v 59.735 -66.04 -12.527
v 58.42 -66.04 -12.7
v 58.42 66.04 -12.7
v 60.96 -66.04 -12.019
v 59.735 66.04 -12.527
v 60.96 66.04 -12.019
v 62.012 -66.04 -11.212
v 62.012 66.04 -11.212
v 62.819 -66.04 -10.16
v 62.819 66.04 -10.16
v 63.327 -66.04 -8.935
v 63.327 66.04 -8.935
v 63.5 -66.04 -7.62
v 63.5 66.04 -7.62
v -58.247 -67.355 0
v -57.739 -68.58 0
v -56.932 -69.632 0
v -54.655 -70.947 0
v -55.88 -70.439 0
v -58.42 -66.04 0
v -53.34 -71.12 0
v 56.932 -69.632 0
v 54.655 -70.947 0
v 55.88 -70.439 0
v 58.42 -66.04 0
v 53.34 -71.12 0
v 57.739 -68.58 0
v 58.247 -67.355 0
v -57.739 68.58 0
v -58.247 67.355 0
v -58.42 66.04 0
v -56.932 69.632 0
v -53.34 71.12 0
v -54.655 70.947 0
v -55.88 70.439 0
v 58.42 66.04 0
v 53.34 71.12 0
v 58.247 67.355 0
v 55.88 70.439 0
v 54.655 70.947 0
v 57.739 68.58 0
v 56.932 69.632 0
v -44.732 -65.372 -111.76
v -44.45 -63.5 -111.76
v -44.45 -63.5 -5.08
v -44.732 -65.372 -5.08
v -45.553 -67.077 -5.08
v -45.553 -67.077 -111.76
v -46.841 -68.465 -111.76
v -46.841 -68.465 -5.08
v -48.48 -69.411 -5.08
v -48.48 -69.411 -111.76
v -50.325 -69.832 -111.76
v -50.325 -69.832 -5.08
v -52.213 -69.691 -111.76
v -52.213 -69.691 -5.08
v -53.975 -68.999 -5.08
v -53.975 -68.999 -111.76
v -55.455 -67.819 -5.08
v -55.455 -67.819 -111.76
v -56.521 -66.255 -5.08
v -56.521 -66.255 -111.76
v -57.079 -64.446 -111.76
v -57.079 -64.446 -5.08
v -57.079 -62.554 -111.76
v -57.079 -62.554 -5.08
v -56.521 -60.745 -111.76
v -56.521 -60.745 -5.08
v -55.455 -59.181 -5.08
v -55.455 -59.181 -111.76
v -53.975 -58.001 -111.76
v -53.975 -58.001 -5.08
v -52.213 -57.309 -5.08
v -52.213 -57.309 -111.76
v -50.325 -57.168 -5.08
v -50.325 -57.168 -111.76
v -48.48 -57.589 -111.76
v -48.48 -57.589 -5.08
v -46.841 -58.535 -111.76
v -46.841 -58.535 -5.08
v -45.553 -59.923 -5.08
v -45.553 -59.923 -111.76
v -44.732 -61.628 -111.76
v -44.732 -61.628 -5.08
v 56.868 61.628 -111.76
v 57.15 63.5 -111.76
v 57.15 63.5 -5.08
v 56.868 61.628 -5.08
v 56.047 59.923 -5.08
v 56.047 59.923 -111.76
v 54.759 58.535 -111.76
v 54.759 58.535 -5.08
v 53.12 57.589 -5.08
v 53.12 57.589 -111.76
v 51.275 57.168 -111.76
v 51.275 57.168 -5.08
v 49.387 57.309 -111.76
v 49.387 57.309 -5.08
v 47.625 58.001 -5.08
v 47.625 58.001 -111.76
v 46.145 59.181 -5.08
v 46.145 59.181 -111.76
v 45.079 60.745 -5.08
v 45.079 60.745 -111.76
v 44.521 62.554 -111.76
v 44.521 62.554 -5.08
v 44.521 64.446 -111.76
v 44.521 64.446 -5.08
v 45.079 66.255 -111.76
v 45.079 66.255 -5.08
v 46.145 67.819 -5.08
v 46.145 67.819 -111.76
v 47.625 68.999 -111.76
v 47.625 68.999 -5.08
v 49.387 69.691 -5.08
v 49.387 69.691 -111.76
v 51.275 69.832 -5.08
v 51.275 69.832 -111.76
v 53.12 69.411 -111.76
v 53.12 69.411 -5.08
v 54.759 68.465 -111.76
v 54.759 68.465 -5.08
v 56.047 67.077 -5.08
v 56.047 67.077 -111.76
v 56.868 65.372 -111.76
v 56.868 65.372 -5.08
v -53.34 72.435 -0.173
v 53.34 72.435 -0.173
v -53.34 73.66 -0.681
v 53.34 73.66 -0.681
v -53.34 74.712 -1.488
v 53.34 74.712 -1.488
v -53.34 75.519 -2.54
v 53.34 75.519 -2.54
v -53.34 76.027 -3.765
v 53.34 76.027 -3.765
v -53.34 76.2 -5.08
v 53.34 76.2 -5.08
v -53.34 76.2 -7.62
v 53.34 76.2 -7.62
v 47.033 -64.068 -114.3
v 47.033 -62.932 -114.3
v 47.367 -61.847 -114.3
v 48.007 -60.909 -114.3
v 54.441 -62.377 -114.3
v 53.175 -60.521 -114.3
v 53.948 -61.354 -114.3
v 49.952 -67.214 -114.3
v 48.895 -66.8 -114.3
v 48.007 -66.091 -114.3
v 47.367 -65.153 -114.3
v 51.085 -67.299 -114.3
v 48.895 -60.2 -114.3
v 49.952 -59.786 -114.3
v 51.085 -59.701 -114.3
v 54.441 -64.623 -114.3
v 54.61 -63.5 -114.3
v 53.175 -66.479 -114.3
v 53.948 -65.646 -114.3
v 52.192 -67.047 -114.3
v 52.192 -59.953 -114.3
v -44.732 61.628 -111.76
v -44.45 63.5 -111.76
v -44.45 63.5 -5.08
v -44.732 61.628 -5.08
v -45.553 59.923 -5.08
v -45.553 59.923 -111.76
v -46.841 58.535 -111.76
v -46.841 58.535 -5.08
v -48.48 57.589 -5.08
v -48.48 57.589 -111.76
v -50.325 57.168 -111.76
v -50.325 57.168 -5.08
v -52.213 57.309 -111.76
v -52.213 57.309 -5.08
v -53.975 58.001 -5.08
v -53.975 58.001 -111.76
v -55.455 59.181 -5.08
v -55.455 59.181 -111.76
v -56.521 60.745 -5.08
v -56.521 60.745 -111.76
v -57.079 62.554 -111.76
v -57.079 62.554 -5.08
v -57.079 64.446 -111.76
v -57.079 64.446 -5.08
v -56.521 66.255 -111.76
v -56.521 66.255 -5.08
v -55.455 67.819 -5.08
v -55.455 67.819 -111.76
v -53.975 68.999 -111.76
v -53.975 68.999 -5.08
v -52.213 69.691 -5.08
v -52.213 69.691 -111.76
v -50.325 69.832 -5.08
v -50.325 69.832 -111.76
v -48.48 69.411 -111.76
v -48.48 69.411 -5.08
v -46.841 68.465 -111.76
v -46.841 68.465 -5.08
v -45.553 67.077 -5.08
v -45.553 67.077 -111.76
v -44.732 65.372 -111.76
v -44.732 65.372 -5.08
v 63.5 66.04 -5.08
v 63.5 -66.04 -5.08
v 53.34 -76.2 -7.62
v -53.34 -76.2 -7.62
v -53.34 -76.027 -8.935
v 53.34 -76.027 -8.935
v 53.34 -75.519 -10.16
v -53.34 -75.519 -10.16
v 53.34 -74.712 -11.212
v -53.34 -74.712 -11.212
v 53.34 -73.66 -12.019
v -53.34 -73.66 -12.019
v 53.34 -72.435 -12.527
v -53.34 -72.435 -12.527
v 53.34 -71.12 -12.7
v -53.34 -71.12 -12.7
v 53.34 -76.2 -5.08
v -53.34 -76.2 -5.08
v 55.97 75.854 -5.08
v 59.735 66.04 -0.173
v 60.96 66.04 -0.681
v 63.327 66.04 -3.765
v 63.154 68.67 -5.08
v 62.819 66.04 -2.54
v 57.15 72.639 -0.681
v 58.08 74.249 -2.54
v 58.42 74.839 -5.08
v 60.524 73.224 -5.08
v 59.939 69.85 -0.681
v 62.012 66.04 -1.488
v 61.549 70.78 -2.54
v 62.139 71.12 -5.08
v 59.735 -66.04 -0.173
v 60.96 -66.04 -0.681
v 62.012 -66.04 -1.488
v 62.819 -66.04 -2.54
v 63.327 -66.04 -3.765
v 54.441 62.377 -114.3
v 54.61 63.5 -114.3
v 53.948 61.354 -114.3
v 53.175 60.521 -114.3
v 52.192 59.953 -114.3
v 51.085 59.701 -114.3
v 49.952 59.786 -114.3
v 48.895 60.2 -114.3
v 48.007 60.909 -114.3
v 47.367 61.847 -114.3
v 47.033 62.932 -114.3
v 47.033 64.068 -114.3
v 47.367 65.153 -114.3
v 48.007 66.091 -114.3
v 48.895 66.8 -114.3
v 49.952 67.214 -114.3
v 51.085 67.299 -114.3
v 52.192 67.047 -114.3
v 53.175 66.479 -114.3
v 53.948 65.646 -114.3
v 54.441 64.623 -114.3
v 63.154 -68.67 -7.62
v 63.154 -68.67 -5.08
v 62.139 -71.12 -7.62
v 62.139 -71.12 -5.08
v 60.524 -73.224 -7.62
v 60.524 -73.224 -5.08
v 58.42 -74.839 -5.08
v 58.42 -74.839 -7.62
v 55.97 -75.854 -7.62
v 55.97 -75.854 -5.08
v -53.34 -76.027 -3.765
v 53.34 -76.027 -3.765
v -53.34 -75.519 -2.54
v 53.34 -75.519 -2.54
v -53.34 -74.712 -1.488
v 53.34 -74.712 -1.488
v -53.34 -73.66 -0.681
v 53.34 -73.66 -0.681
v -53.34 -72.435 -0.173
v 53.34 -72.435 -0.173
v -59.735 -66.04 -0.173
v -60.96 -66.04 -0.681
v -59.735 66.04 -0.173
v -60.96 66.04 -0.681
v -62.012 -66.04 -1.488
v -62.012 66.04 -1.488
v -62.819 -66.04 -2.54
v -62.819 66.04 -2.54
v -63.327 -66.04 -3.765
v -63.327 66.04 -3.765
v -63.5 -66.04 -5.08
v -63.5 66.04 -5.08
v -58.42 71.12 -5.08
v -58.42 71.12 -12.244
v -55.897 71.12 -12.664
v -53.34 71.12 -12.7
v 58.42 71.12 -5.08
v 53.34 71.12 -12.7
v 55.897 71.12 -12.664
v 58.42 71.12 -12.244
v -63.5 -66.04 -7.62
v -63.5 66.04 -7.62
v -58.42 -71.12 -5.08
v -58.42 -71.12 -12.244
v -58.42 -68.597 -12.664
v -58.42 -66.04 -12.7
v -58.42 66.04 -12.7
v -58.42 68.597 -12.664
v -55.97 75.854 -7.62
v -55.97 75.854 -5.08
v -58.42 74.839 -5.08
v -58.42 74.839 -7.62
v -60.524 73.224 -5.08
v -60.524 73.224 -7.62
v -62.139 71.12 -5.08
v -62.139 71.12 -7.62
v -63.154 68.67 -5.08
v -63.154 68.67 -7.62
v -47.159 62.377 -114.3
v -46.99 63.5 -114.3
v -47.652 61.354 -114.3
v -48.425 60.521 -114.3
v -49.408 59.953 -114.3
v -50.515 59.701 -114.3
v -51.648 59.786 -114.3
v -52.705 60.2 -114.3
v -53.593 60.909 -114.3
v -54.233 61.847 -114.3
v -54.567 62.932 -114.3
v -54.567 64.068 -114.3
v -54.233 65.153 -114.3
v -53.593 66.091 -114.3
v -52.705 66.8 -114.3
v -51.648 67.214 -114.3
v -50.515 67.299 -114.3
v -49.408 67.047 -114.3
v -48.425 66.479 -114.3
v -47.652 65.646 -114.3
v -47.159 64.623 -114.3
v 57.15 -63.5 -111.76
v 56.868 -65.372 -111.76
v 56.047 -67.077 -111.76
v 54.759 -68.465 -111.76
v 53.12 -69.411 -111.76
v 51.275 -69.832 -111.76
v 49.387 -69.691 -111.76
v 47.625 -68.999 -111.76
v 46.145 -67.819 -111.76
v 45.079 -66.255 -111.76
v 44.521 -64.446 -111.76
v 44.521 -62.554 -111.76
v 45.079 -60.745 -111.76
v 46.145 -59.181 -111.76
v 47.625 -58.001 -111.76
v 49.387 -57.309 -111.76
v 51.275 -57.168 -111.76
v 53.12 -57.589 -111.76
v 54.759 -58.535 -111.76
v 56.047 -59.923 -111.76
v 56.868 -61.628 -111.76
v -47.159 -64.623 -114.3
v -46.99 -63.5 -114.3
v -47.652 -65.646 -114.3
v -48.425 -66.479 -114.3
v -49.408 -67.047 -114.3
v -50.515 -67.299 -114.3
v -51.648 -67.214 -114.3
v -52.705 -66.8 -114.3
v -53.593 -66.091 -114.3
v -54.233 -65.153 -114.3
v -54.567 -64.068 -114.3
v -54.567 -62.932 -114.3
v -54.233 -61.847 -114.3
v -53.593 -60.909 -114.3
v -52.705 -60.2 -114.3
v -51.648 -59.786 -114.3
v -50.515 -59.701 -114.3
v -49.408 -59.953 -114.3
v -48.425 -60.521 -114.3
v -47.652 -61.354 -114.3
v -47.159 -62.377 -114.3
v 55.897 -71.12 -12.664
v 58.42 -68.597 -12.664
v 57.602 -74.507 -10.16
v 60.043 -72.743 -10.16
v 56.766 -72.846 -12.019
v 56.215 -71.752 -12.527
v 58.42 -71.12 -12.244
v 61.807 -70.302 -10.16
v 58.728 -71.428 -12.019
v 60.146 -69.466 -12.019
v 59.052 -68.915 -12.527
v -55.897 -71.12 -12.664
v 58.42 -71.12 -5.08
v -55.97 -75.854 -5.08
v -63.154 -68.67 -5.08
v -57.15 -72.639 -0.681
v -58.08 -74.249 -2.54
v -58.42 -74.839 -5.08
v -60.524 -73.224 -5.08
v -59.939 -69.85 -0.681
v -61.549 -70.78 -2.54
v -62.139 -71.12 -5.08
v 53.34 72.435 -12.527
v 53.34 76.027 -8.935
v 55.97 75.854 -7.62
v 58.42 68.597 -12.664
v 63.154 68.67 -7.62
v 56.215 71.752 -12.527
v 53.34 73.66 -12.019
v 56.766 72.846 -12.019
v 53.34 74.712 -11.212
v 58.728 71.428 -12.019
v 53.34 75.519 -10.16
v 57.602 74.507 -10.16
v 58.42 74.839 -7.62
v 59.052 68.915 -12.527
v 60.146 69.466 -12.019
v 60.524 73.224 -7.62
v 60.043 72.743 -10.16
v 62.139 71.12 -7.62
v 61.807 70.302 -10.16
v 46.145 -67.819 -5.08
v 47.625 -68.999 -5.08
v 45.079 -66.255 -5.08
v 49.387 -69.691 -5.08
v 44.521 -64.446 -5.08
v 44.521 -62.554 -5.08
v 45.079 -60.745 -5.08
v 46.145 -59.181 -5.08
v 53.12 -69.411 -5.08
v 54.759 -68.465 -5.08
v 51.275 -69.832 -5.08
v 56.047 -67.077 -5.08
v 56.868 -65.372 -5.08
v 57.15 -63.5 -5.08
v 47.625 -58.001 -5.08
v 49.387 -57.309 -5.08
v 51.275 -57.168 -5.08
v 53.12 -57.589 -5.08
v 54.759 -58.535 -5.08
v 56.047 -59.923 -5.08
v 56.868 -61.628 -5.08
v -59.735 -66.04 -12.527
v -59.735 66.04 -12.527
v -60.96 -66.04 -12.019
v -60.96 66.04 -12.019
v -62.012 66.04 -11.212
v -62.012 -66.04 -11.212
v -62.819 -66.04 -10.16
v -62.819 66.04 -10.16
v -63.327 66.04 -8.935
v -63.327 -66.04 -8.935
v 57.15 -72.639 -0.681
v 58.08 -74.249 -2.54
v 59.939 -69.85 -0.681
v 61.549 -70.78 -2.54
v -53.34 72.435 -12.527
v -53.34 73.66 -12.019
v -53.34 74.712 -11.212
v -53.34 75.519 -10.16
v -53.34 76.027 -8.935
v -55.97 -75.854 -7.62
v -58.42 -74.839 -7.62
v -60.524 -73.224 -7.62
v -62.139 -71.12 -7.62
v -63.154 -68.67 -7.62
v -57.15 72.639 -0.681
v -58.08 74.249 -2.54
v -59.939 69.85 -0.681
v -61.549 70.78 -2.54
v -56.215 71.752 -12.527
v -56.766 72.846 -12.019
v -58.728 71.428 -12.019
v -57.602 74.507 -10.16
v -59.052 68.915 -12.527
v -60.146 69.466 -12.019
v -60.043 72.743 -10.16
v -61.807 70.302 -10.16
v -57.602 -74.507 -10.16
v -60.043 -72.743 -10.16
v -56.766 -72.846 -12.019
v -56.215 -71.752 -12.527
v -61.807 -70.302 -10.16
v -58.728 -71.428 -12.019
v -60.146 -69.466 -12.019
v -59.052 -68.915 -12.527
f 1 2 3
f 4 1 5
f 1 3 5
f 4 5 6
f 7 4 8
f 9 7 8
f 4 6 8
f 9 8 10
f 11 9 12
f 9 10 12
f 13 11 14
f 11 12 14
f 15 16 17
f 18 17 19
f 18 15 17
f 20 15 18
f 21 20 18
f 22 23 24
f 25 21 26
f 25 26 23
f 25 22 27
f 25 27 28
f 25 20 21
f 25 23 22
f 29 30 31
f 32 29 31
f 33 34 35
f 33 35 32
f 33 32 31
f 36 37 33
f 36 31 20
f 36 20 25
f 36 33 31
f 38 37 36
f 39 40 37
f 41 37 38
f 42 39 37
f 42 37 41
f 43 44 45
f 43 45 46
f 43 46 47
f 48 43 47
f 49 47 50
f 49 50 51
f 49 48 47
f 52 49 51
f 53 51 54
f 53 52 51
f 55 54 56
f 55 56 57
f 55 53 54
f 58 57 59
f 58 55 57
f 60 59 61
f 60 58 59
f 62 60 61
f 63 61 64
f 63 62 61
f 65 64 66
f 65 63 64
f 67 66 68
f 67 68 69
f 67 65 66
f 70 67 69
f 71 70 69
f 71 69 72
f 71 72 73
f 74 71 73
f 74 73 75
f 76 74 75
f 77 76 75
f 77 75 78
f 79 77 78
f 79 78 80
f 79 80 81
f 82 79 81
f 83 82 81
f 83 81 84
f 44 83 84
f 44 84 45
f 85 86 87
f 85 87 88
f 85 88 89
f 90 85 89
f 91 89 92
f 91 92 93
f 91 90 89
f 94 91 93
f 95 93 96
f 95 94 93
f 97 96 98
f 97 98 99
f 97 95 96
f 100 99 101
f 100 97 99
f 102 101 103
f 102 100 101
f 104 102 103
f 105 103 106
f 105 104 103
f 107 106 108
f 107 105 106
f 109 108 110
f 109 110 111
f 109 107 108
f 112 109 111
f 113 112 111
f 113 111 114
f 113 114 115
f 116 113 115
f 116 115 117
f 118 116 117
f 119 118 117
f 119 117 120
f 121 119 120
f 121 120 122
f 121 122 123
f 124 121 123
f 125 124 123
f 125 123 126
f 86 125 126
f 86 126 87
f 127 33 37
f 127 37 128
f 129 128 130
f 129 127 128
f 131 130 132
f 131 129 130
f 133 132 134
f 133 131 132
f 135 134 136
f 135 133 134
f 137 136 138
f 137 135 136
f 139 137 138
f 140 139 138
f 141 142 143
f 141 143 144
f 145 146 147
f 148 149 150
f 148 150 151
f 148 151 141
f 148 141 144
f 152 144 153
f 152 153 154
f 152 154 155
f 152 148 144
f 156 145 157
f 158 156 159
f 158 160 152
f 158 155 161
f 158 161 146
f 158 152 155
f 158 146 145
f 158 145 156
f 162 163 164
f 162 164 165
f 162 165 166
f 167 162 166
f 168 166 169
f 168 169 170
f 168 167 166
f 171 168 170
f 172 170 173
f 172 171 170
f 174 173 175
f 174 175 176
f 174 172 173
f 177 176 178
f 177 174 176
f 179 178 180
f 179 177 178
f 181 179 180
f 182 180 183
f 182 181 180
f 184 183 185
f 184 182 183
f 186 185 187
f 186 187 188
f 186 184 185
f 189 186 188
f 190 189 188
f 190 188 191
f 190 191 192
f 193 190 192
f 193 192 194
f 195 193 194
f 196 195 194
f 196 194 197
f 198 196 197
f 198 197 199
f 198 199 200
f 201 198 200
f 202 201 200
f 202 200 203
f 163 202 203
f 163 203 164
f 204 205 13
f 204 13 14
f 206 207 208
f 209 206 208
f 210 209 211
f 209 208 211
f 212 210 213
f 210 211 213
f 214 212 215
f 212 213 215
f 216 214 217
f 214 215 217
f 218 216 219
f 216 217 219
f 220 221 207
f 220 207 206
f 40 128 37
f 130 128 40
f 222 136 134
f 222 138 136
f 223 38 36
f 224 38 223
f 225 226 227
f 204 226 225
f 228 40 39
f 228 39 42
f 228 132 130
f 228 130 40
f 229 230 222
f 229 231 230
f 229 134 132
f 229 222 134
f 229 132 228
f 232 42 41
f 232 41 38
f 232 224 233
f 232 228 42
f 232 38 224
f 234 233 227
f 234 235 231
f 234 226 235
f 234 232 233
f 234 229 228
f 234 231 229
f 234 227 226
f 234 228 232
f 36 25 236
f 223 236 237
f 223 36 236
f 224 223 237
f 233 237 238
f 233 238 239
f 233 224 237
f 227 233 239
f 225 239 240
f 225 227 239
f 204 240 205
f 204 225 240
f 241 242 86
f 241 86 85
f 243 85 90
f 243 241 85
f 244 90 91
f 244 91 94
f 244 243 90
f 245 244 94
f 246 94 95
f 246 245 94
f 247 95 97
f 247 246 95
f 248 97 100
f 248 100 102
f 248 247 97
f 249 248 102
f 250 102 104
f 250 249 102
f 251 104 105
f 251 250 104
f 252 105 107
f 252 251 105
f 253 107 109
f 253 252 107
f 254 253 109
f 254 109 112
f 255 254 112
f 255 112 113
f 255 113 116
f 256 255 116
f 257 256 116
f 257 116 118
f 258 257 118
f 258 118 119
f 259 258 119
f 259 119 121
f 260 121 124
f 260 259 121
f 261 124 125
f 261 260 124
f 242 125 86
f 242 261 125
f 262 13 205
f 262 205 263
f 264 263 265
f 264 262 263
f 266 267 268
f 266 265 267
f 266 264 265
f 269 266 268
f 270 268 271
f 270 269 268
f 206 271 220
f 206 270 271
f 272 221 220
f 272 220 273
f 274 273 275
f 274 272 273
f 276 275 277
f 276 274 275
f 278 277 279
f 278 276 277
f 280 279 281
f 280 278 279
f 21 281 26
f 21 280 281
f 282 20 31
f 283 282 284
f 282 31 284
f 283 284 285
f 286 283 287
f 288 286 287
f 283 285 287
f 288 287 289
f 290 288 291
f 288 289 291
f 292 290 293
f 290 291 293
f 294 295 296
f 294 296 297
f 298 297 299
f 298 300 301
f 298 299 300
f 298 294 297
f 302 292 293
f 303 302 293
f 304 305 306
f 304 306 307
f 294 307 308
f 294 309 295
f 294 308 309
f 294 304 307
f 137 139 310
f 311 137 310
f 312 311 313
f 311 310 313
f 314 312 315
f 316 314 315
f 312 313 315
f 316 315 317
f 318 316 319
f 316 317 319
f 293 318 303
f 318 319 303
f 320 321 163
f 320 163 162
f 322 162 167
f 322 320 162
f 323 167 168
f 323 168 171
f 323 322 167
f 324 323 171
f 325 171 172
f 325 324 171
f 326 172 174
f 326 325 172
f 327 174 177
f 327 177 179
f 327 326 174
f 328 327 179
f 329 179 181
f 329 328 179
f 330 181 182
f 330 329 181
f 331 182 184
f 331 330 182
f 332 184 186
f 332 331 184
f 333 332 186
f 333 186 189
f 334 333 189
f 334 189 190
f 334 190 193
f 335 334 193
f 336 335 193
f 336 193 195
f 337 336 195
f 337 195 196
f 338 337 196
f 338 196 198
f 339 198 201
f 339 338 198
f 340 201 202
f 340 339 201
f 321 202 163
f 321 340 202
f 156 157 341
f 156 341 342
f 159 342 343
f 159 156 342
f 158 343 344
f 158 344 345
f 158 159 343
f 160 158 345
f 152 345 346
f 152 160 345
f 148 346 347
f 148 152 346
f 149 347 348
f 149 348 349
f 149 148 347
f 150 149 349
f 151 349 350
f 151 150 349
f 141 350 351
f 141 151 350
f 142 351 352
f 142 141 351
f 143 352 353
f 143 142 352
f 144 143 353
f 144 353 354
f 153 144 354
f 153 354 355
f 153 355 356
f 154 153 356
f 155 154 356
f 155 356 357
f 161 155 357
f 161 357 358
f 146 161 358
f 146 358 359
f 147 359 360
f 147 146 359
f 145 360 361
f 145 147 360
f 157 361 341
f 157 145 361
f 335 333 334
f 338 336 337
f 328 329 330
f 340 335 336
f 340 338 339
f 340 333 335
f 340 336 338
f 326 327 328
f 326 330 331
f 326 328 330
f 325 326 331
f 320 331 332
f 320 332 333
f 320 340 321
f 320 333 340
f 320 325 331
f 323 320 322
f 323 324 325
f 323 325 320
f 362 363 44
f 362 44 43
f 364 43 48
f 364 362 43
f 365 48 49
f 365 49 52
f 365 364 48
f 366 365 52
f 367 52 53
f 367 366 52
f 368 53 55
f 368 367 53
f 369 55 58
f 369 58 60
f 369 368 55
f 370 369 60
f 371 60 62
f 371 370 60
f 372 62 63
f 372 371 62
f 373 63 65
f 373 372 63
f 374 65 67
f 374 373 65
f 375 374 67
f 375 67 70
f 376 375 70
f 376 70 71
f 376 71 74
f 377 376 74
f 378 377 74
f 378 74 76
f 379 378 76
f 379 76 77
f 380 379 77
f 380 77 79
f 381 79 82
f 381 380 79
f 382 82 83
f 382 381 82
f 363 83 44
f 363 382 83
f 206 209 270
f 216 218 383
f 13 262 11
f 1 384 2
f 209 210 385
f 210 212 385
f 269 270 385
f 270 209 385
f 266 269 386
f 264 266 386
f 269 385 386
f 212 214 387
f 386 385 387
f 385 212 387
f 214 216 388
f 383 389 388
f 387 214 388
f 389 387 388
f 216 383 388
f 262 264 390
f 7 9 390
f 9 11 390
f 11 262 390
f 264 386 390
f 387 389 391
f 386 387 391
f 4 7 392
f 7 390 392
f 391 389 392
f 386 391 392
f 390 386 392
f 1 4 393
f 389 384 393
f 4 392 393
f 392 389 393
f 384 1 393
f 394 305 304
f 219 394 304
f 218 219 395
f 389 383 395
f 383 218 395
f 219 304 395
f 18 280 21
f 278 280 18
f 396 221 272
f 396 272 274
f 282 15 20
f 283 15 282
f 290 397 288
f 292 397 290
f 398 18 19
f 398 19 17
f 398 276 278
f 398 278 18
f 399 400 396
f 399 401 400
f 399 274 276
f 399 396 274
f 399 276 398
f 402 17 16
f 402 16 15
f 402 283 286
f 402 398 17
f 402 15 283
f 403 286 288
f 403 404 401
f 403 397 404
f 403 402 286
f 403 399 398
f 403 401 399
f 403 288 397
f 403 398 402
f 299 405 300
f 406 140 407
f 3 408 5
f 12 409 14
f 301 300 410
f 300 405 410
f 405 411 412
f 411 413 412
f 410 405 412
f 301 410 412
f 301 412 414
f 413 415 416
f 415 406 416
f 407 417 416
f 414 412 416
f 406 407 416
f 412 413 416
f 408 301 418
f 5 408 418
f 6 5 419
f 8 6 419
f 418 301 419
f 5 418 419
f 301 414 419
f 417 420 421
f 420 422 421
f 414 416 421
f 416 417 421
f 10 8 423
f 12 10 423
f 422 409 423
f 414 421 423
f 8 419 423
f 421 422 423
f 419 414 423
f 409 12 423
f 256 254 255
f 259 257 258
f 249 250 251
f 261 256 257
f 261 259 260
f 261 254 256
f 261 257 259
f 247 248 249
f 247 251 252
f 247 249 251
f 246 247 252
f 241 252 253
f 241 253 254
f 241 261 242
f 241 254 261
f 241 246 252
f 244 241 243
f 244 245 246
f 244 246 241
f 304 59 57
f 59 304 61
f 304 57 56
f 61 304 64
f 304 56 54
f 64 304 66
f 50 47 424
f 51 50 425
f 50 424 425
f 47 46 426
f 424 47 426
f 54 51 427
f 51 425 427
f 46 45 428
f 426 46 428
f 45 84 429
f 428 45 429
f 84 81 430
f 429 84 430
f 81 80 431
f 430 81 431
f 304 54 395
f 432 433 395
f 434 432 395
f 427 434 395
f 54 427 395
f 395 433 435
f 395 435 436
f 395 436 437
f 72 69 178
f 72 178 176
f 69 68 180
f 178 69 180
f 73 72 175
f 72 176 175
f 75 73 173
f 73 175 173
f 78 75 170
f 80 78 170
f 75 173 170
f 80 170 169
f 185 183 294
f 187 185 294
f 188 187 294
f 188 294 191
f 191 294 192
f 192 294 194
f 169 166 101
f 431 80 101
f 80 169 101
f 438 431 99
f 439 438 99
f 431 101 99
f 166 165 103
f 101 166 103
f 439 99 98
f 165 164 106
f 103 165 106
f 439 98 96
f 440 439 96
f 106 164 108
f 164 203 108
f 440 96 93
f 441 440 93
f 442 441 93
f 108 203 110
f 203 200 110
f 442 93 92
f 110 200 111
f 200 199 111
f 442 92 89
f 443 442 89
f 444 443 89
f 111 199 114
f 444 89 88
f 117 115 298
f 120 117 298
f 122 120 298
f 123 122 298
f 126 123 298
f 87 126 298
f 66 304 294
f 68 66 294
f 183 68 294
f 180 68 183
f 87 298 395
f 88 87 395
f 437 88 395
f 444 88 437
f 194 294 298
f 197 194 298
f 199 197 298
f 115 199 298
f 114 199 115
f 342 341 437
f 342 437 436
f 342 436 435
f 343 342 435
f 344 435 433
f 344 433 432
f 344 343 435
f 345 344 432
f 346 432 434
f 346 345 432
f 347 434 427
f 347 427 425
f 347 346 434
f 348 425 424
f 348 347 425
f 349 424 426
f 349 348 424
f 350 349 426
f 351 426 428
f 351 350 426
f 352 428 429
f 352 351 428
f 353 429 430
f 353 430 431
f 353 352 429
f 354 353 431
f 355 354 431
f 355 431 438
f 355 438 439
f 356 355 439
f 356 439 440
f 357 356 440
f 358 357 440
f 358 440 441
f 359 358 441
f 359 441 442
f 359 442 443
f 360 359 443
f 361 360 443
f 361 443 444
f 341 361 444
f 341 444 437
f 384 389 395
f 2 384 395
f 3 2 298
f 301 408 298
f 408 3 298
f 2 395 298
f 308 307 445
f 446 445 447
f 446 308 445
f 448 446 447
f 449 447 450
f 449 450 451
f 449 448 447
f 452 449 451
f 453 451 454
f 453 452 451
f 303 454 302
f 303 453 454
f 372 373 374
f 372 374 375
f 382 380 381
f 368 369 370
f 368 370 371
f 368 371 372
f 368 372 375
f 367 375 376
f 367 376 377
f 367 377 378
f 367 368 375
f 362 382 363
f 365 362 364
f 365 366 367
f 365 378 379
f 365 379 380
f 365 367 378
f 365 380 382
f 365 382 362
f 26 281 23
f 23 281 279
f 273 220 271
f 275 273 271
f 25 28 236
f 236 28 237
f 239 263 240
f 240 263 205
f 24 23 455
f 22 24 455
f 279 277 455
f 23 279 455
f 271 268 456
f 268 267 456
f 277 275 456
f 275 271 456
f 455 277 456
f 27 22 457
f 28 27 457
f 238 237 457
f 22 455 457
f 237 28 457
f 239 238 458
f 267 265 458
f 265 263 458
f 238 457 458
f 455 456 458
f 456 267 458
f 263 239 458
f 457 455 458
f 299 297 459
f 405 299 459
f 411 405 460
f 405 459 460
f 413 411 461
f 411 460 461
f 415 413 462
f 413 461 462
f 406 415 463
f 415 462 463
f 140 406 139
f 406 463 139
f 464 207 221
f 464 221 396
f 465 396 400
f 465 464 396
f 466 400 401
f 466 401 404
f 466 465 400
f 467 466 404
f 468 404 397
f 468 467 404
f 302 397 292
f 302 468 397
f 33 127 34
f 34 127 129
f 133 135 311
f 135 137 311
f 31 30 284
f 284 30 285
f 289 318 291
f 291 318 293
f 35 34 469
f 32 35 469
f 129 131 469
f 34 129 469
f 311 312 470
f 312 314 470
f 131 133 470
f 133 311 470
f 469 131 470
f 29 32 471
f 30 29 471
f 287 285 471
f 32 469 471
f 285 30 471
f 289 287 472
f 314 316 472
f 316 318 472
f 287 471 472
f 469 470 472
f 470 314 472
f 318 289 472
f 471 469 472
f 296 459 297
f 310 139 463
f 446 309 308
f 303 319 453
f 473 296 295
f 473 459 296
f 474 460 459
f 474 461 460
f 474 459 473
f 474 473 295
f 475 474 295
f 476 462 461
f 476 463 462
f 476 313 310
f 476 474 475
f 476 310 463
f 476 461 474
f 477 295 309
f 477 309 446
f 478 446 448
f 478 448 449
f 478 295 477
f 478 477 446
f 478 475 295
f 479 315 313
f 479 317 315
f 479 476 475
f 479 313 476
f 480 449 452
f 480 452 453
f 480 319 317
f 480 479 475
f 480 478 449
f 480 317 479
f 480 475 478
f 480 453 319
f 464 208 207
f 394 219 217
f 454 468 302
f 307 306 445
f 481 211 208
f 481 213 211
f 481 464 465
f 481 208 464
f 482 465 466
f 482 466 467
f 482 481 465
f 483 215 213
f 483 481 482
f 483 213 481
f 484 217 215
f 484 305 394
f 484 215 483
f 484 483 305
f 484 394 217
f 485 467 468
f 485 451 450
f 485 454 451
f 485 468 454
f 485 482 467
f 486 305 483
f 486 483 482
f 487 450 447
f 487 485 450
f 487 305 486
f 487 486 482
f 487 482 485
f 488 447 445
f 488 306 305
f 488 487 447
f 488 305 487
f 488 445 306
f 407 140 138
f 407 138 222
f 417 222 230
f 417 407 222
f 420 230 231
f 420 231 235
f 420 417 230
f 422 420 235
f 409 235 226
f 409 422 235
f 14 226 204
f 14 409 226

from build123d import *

# Parameters (mm, degrees)
F0_W          = 127
F0_H          = 152.4
F1_DEPTH      = 12.7
F2_T          = -5.08
F3_R          = 6.35
F4_DEPTH      = 101.6
F4_DEPTH_BACK = 7.62
F5_R          = 10.16
F6_T1_DEPTH   = 132.08
F6_T3_DEPTH   = 106.68
F6_T6_ANGLE   = 90
F6_T8_ANGLE   = 90
F6_T10_ANGLE  = 90
F6_T12_ANGLE  = 90
F6_T14_ANGLE  = 90
F6_T16_ANGLE  = 90
F6_T18_ANGLE  = 90
F6_T20_ANGLE  = 90
F7_SIZE       = 2.54


# Not quite as in the source:
# - a fillet or chamfer that OpenCascade refuses, or shapes differently, is made with other operations: its cross-section is extruded or revolved along the edge and cut away or added


with BuildPart() as f1:
    # F0 (on Top) → F1 (new body)
    with BuildSketch(Plane.XY):
        Rectangle(F0_W, F0_H)
    extrude(amount=-F1_DEPTH)

    # F2
    f2_openings = [f1.faces().sort_by_distance(p)[0] for p in [
        (0, 0, -12.7),
    ]]
    offset(amount=F2_T, openings=f2_openings)

    # F3 (on face) → F4 (join, two sides)
    with BuildSketch(Plane(origin=(0, 0, -12.7), x_dir=(1, 0, 0), z_dir=(0, 0, -1))) as f4_sk:
        with Locations((-50.8, 63.5)):
            Circle(F3_R)
        with Locations((50.8, 63.5)):
            Circle(F3_R)
        with Locations((50.8, -63.5)):
            Circle(F3_R)
        with Locations((-50.8, -63.5)):
            Circle(F3_R)
    extrude(amount=F4_DEPTH)
    extrude(f4_sk.sketch, amount=-F4_DEPTH_BACK)

    # F5
    f5_edges = [f1.edges().sort_by_distance(p)[0] for p in [
        (-63.5, -76.2, -6.35),
        (-63.5, 76.2, -6.35),
        (63.5, 76.2, -6.35),
        (63.5, -76.2, -6.35),
    ]]
    fillet(f5_edges, radius=F5_R)

    # F6: fillet of radius 5.08 on 18 edges, made by hand

    # F6_s2 → F6_t1 (cut)
    with BuildSketch(Plane.XZ.offset(-66.04)):
        with BuildLine():
            ThreePointArc((-58.42, 0), (-62.0121024484, -1.4878975516), (-63.5, -5.08))
            Line((-63.5, -5.08), (-63.5, 0))
            Line((-63.5, 0), (-58.42, 0))
        make_face()
        with BuildLine():
            ThreePointArc((-58.42, -12.7), (-62.0121024484, -11.2121024484), (-63.5, -7.62))
            Line((-63.5, -7.62), (-63.5, -12.7))
            Line((-63.5, -12.7), (-58.42, -12.7))
        make_face()
        with BuildLine():
            ThreePointArc((58.42, 0), (62.0121024484, -1.4878975516), (63.5, -5.08))
            Line((63.5, -5.08), (63.5, 0))
            Line((63.5, 0), (58.42, 0))
        make_face()
        with BuildLine():
            ThreePointArc((58.42, -12.7), (62.0121024484, -11.2121024484), (63.5, -7.62))
            Line((63.5, -7.62), (63.5, -12.7))
            Line((63.5, -12.7), (58.42, -12.7))
        make_face()
    extrude(amount=F6_T1_DEPTH, mode=Mode.SUBTRACT)

    # F6_s4 → F6_t3 (cut)
    with BuildSketch(Plane.YZ.offset(-53.34)):
        with BuildLine():
            ThreePointArc((-76.2, -5.08), (-74.7121024484, -1.4878975516), (-71.12, 0))
            Line((-71.12, 0), (-76.2, 0))
            Line((-76.2, 0), (-76.2, -5.08))
        make_face()
        with BuildLine():
            ThreePointArc((-76.2, -7.62), (-74.7121024484, -11.2121024484), (-71.12, -12.7))
            Line((-71.12, -12.7), (-76.2, -12.7))
            Line((-76.2, -12.7), (-76.2, -7.62))
        make_face()
        with BuildLine():
            ThreePointArc((71.12, 0), (74.7121024484, -1.4878975516), (76.2, -5.08))
            Line((76.2, -5.08), (76.2, 0))
            Line((76.2, 0), (71.12, 0))
        make_face()
        with BuildLine():
            ThreePointArc((71.12, -12.7), (74.7121024484, -11.2121024484), (76.2, -7.62))
            Line((76.2, -7.62), (76.2, -12.7))
            Line((76.2, -12.7), (71.12, -12.7))
        make_face()
    extrude(amount=F6_T3_DEPTH, mode=Mode.SUBTRACT)

    # F6_s5 → F6_t6 (revolve, cut)
    with BuildSketch(Plane.YZ.offset(-53.34)):
        with BuildLine():
            ThreePointArc((-71.12, 0), (-74.7121024484, -1.4878975516), (-76.2, -5.08))
            Line((-76.2, -5.08), (-76.2, 0))
            Line((-76.2, 0), (-71.12, 0))
        make_face()
    revolve(axis=Axis((-53.34, -66.04, 0), (0, 0, -1)), revolution_arc=F6_T6_ANGLE, mode=Mode.SUBTRACT)

    # F6_s7 → F6_t8 (revolve, cut)
    with BuildSketch(Plane.YZ.offset(53.34)):
        with BuildLine():
            ThreePointArc((-71.12, 0), (-74.7121024484, -1.4878975516), (-76.2, -5.08))
            Line((-76.2, -5.08), (-76.2, 0))
            Line((-76.2, 0), (-71.12, 0))
        make_face()
    revolve(axis=Axis((53.34, -66.04, 0), (0, 0, 1)), revolution_arc=F6_T8_ANGLE, mode=Mode.SUBTRACT)

    # F6_s9 → F6_t10 (revolve, cut)
    with BuildSketch(Plane.YZ.offset(-53.34)):
        with BuildLine():
            ThreePointArc((71.12, 0), (74.7121024484, -1.4878975516), (76.2, -5.08))
            Line((76.2, -5.08), (76.2, 0))
            Line((76.2, 0), (71.12, 0))
        make_face()
    revolve(axis=Axis((-53.34, 66.04, 0), (0, 0, 1)), revolution_arc=F6_T10_ANGLE, mode=Mode.SUBTRACT)

    # F6_s11 → F6_t12 (revolve, cut)
    with BuildSketch(Plane.YZ.offset(53.34)):
        with BuildLine():
            ThreePointArc((71.12, 0), (74.7121024484, -1.4878975516), (76.2, -5.08))
            Line((76.2, -5.08), (76.2, 0))
            Line((76.2, 0), (71.12, 0))
        make_face()
    revolve(axis=Axis((53.34, 66.04, 0), (0, 0, -1)), revolution_arc=F6_T12_ANGLE, mode=Mode.SUBTRACT)

    # F6_s13 → F6_t14 (revolve, cut)
    with BuildSketch(Plane.YZ.offset(-53.34)):
        with BuildLine():
            ThreePointArc((-76.2, -7.62), (-74.7121024484, -11.2121024484), (-71.12, -12.7))
            Line((-71.12, -12.7), (-76.2, -12.7))
            Line((-76.2, -12.7), (-76.2, -7.62))
        make_face()
    revolve(axis=Axis((-53.34, -66.04, -12.7), (0, 0, -1)), revolution_arc=F6_T14_ANGLE, mode=Mode.SUBTRACT)

    # F6_s15 → F6_t16 (revolve, cut)
    with BuildSketch(Plane.YZ.offset(53.34)):
        with BuildLine():
            ThreePointArc((-76.2, -7.62), (-74.7121024484, -11.2121024484), (-71.12, -12.7))
            Line((-71.12, -12.7), (-76.2, -12.7))
            Line((-76.2, -12.7), (-76.2, -7.62))
        make_face()
    revolve(axis=Axis((53.34, -66.04, -12.7), (0, 0, 1)), revolution_arc=F6_T16_ANGLE, mode=Mode.SUBTRACT)

    # F6_s17 → F6_t18 (revolve, cut)
    with BuildSketch(Plane.YZ.offset(-53.34)):
        with BuildLine():
            ThreePointArc((71.12, -12.7), (74.7121024484, -11.2121024484), (76.2, -7.62))
            Line((76.2, -7.62), (76.2, -12.7))
            Line((76.2, -12.7), (71.12, -12.7))
        make_face()
    revolve(axis=Axis((-53.34, 66.04, -12.7), (0, 0, 1)), revolution_arc=F6_T18_ANGLE, mode=Mode.SUBTRACT)

    # F6_s19 → F6_t20 (revolve, cut)
    with BuildSketch(Plane.YZ.offset(53.34)):
        with BuildLine():
            ThreePointArc((71.12, -12.7), (74.7121024484, -11.2121024484), (76.2, -7.62))
            Line((76.2, -7.62), (76.2, -12.7))
            Line((76.2, -12.7), (71.12, -12.7))
        make_face()
    revolve(axis=Axis((53.34, 66.04, -12.7), (0, 0, -1)), revolution_arc=F6_T20_ANGLE, mode=Mode.SUBTRACT)

    # F7
    f7_edges = [f1.edges().sort_by_distance(p)[0] for p in [
        (-57.15, -63.5, -114.3),
        (44.45, -63.5, -114.3),
        (-57.15, 63.5, -114.3),
        (44.45, 63.5, -114.3),
    ]]
    chamfer(f7_edges, length=F7_SIZE)


solid = f1.part
